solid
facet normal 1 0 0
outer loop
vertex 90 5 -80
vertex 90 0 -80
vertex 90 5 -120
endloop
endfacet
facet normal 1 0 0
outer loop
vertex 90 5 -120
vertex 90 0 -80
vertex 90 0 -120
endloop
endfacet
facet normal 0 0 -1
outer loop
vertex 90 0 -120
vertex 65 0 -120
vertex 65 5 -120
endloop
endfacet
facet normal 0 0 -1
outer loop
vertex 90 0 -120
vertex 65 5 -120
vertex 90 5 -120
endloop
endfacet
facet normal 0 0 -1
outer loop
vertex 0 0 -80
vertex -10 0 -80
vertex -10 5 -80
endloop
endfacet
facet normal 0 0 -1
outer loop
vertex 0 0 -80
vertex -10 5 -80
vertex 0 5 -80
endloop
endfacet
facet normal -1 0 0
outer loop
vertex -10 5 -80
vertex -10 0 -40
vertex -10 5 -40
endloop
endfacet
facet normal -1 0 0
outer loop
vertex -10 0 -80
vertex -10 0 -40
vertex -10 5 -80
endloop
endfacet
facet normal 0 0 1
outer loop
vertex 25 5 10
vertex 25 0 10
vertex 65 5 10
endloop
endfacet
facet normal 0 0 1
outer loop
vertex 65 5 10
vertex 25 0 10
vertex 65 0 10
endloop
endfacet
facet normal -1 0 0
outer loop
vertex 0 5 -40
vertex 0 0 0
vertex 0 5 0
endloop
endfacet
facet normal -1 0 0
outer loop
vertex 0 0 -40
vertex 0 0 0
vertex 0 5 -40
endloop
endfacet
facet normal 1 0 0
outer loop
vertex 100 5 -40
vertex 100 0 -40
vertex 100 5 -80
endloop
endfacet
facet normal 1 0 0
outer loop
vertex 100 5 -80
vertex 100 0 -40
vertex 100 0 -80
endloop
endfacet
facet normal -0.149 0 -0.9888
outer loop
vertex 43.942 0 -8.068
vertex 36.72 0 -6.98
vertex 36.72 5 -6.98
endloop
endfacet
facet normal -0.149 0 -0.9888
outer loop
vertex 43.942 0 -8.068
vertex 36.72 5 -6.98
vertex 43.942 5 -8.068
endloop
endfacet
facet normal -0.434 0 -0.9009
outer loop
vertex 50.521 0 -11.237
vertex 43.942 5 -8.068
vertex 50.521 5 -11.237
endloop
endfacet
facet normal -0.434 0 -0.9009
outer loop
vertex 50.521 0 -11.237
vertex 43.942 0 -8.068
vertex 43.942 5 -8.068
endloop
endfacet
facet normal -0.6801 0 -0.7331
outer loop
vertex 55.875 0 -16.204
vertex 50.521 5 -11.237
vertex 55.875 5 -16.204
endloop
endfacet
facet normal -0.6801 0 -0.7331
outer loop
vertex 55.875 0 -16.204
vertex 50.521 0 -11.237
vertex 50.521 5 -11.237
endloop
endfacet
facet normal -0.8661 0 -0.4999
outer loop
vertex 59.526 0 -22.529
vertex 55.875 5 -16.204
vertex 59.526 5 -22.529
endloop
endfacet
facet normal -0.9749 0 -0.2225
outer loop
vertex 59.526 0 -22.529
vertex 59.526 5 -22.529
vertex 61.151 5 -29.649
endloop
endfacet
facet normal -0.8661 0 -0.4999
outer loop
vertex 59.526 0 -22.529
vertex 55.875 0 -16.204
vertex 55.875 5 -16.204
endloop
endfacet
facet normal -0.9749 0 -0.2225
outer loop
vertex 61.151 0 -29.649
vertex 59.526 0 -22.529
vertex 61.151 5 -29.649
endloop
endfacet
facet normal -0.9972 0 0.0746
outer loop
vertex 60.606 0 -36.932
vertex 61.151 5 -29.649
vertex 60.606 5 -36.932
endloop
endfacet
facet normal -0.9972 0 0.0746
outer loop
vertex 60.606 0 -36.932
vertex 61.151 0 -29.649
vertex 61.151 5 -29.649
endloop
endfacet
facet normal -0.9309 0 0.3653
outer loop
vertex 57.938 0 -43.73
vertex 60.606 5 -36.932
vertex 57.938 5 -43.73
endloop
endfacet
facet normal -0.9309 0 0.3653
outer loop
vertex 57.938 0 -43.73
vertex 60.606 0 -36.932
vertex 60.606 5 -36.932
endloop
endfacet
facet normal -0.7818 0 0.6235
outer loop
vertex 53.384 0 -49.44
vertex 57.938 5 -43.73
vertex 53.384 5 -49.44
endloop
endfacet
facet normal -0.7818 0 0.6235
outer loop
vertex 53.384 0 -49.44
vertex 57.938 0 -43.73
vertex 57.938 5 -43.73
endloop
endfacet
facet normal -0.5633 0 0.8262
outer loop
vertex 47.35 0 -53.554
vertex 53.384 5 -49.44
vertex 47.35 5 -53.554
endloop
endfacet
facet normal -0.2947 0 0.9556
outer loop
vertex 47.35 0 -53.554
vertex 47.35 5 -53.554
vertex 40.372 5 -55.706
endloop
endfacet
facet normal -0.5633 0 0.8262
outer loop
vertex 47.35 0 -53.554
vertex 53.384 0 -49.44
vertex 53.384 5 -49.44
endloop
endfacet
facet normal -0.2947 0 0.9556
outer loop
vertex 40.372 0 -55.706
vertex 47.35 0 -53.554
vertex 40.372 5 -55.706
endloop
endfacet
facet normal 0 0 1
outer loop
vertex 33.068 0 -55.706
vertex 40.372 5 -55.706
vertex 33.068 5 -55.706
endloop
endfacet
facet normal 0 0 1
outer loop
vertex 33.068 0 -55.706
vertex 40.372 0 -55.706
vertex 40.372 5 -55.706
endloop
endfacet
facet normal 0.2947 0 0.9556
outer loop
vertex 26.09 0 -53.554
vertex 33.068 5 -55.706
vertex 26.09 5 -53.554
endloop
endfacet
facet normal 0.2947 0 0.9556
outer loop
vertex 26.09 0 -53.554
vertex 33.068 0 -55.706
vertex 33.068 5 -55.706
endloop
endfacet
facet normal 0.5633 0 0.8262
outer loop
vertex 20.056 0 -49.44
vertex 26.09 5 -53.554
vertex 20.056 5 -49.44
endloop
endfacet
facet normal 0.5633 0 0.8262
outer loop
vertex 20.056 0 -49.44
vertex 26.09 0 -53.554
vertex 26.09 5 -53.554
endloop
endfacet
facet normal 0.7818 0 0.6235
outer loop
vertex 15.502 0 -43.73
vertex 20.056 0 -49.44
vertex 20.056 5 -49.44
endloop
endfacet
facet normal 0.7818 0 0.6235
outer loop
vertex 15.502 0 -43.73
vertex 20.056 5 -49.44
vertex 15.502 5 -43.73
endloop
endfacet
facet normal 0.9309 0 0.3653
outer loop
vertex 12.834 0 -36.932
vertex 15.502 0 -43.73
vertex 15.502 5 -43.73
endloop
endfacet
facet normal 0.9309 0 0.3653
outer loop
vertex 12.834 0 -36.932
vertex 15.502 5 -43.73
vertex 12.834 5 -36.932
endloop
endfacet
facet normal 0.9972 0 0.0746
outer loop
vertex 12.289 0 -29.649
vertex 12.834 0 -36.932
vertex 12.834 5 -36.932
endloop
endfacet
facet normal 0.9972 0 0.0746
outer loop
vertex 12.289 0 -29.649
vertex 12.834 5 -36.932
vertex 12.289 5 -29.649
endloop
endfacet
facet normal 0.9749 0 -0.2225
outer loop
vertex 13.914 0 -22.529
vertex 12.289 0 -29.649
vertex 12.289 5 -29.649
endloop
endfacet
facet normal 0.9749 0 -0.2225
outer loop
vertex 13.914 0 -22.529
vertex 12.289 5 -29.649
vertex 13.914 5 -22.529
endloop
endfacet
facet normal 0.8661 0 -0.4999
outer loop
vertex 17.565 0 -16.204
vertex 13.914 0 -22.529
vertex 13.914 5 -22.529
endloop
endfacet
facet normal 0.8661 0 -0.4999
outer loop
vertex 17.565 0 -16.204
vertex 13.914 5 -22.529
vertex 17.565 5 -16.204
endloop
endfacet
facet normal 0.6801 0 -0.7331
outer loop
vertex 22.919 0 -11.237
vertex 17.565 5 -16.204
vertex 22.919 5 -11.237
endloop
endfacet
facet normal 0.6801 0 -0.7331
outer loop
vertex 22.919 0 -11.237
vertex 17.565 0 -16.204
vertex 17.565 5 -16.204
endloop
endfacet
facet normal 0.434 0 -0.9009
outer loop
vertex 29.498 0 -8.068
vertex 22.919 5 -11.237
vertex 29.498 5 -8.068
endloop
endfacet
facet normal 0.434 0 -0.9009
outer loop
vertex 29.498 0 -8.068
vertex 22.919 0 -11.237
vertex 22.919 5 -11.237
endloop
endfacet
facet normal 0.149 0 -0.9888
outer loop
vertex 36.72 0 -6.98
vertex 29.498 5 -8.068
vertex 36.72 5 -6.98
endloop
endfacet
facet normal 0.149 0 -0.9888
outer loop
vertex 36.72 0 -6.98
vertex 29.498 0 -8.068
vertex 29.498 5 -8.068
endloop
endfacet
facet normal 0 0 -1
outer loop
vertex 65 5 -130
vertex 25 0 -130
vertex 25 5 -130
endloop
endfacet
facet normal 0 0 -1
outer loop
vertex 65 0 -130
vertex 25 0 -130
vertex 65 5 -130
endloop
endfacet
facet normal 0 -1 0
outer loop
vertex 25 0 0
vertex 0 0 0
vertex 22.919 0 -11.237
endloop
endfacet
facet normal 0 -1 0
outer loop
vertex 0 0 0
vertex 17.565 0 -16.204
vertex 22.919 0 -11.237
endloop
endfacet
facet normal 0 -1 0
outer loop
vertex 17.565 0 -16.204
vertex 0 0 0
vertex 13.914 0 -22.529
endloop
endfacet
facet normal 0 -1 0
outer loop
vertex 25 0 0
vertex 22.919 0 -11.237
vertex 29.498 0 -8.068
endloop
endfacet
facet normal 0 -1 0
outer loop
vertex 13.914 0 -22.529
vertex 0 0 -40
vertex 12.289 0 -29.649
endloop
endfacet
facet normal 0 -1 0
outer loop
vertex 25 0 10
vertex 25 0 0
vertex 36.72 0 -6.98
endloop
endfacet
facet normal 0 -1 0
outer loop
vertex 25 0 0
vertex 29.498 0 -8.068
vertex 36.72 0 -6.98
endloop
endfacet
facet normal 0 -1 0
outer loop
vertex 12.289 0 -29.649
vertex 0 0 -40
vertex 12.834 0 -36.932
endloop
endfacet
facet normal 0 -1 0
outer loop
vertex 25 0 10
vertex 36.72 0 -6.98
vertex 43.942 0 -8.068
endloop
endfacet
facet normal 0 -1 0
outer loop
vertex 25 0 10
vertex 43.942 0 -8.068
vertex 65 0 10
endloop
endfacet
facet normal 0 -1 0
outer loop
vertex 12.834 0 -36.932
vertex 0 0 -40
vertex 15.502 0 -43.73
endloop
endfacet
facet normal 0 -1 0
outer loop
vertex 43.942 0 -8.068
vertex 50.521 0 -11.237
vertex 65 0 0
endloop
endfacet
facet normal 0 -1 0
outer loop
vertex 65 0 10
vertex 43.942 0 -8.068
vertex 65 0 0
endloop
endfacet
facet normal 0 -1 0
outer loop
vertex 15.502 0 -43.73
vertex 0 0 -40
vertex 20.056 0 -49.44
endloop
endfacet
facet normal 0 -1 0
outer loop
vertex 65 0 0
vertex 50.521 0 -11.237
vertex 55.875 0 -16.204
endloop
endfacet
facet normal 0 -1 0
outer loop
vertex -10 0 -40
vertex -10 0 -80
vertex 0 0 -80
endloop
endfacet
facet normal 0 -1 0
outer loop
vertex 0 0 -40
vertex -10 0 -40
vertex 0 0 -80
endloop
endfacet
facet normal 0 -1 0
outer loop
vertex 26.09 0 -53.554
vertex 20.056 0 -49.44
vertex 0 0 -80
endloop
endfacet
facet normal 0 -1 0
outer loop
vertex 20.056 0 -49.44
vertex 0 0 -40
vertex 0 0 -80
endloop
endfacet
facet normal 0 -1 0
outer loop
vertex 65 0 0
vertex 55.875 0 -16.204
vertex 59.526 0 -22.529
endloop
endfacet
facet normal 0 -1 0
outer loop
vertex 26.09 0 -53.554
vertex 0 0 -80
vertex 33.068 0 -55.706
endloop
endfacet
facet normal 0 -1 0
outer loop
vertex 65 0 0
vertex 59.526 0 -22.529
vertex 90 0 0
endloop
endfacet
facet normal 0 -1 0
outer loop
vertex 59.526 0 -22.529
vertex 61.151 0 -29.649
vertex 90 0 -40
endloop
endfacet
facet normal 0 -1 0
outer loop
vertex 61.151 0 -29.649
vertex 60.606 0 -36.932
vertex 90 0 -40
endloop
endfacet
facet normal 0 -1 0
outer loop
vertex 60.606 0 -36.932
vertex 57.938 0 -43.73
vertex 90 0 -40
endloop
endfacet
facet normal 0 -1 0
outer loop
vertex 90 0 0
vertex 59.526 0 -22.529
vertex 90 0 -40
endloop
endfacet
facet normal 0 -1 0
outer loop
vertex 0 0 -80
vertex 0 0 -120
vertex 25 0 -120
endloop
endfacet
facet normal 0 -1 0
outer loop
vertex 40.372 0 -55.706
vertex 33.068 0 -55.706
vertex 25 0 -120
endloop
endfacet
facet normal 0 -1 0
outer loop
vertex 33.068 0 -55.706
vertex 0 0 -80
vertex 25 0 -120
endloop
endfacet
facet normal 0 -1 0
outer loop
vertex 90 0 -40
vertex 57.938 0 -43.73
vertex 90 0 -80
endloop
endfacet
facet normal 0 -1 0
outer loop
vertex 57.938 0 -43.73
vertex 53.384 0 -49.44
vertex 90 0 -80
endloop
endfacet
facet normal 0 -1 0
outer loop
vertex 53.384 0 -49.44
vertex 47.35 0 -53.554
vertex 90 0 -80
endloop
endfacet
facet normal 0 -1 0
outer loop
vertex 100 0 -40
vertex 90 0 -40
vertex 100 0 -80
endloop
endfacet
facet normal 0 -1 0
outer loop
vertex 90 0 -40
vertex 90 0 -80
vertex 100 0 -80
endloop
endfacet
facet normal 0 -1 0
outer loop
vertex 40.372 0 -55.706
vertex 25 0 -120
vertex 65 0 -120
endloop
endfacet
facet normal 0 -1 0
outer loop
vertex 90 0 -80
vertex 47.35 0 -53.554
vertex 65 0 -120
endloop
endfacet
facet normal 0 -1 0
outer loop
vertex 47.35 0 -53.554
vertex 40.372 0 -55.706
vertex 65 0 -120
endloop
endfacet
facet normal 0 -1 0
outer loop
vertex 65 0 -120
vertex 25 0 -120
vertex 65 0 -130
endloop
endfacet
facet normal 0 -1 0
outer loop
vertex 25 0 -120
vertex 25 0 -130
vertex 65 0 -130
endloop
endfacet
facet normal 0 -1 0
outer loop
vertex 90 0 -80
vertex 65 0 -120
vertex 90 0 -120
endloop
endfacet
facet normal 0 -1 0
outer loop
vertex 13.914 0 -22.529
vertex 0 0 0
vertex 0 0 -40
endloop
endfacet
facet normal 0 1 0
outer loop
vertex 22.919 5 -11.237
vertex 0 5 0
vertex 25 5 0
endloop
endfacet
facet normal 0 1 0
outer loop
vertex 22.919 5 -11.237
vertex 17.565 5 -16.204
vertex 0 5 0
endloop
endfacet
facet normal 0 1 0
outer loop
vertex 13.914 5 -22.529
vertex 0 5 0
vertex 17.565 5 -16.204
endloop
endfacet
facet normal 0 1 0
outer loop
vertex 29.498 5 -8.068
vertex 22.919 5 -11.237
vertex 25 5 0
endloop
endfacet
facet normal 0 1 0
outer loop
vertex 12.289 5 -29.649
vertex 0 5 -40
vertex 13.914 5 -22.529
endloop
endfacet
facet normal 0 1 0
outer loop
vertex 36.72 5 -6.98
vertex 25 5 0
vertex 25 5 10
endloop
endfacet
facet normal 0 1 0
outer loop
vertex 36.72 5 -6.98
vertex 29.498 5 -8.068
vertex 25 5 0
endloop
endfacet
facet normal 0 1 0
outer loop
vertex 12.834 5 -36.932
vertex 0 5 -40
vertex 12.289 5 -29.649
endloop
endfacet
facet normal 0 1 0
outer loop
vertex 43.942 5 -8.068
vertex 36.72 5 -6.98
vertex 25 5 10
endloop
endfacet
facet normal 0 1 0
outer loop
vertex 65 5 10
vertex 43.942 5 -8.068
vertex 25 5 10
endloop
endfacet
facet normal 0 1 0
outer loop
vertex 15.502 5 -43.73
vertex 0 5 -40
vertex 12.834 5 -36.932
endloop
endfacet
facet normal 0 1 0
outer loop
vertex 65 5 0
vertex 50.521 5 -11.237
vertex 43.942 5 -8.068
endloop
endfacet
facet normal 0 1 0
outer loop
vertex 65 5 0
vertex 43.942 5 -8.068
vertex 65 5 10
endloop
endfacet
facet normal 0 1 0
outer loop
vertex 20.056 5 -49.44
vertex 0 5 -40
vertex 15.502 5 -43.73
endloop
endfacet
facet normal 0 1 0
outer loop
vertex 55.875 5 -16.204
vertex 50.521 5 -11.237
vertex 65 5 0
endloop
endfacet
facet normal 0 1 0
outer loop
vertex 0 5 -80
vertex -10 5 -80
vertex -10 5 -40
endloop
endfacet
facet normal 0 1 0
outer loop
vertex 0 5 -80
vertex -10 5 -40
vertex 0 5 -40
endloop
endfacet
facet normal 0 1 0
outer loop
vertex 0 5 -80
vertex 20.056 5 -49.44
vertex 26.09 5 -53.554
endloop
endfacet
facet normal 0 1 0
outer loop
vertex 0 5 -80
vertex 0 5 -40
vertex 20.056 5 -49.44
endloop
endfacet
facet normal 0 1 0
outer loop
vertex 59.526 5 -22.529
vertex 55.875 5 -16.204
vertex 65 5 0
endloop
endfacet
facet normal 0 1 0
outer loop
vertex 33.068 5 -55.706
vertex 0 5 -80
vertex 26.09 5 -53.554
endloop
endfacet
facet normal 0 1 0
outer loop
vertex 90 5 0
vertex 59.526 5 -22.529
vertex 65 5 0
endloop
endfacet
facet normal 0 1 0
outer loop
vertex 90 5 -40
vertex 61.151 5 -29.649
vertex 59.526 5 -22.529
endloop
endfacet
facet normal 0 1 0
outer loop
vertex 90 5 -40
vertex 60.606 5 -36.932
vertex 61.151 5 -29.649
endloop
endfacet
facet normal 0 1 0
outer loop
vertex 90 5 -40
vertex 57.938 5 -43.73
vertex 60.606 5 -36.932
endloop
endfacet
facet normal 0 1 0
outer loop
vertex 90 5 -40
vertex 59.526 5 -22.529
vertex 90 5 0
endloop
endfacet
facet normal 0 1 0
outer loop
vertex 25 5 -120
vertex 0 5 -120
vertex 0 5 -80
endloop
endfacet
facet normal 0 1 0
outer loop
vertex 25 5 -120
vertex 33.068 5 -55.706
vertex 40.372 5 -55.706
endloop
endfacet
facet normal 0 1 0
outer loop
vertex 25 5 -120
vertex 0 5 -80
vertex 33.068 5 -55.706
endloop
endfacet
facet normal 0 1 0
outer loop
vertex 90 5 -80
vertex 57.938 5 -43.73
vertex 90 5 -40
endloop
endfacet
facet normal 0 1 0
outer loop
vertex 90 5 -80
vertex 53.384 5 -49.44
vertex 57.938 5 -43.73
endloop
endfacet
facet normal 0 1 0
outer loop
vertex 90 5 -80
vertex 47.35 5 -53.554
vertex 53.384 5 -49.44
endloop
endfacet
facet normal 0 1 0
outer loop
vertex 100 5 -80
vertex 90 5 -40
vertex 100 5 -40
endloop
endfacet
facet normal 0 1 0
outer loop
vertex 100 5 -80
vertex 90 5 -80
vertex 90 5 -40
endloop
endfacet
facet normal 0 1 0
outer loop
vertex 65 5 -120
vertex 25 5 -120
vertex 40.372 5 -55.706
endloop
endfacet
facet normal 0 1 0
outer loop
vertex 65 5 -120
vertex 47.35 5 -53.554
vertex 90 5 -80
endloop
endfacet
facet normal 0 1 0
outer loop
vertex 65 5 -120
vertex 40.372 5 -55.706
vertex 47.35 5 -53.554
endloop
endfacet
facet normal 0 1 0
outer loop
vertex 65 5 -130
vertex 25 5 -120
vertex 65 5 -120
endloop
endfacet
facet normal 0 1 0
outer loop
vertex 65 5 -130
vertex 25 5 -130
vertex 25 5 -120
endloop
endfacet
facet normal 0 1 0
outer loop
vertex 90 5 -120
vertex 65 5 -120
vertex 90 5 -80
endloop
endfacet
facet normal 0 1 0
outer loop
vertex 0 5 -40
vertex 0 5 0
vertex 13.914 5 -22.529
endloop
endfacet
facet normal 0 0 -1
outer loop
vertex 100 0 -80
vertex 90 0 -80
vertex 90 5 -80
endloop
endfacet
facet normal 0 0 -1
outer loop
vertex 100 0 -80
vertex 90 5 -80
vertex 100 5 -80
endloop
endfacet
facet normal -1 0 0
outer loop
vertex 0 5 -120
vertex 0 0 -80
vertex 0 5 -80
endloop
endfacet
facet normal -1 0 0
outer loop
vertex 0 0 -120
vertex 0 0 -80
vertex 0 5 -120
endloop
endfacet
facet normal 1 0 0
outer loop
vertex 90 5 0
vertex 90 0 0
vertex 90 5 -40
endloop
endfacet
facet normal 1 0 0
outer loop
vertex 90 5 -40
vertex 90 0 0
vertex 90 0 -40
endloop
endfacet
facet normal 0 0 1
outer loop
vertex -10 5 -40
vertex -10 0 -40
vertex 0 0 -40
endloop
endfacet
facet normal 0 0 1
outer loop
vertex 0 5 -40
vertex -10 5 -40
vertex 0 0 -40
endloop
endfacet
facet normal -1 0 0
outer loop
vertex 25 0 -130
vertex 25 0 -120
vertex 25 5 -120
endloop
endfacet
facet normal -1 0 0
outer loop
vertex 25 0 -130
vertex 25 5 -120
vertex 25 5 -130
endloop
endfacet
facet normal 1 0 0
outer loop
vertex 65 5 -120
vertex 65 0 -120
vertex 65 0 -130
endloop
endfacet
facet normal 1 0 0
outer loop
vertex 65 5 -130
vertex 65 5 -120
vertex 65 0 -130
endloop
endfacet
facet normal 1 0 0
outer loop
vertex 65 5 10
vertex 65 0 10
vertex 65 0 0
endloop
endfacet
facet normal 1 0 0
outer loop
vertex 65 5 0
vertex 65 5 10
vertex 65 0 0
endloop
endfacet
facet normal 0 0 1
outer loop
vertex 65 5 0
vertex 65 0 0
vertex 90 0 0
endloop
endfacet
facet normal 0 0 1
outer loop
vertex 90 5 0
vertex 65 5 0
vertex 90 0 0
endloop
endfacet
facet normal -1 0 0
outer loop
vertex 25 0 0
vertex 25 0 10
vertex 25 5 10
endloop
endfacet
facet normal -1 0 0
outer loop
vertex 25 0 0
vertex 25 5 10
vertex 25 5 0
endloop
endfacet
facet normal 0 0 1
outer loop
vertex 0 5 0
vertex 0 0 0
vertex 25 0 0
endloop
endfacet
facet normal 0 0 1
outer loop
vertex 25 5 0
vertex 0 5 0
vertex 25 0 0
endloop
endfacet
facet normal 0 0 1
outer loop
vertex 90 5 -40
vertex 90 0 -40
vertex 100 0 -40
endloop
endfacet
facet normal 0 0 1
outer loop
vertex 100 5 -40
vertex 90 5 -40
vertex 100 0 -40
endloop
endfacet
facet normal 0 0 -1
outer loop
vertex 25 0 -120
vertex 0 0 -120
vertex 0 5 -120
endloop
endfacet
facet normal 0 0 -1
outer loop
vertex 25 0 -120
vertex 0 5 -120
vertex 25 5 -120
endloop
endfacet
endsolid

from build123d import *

# Parameters (mm, degrees)
SKETCH1_W           = 90
SKETCH1_H           = 120
SKETCH1_R           = 24.5
SKETCH1_W_2         = 10
SKETCH1_H_2         = 40
SKETCH1_W_3         = 40
SKETCH1_H_3         = 10
BOSS_EXTRUDE1_DEPTH = 5


with BuildPart() as part:
    # Sketch1 → Boss-Extrude1 (new body)
    # profile 1 of 5: a face of its own
    with BuildSketch(Plane(origin=(0, 0, 0), x_dir=(1, 0, 0), z_dir=(0, 1, 0))):
        with Locations((45, 60)):
            Rectangle(SKETCH1_W, SKETCH1_H)
        with Locations(Location((36.72, 31.48, 0), (0, 0, 270))):
            Circle(SKETCH1_R, mode=Mode.SUBTRACT)
    # profile 2 of 5: a face of its own
    with BuildSketch(Plane(origin=(0, 0, 0), x_dir=(1, 0, 0), z_dir=(0, 1, 0))):
        with Locations((-5, 60)):
            Rectangle(SKETCH1_W_2, SKETCH1_H_2)
    # profile 3 of 5: a face of its own
    with BuildSketch(Plane(origin=(0, 0, 0), x_dir=(1, 0, 0), z_dir=(0, 1, 0))):
        with Locations((45, 125)):
            Rectangle(SKETCH1_W_3, SKETCH1_H_3)
    # profile 4 of 5: a face of its own
    with BuildSketch(Plane(origin=(0, 0, 0), x_dir=(1, 0, 0), z_dir=(0, 1, 0))):
        with Locations((95, 60)):
            Rectangle(SKETCH1_W_2, SKETCH1_H_2)
    # profile 5 of 5: a face of its own
    with BuildSketch(Plane(origin=(0, 0, 0), x_dir=(1, 0, 0), z_dir=(0, 1, 0))):
        with Locations((45, -5)):
            Rectangle(SKETCH1_W_3, SKETCH1_H_3)
    extrude(amount=BOSS_EXTRUDE1_DEPTH)


solid = part.part
